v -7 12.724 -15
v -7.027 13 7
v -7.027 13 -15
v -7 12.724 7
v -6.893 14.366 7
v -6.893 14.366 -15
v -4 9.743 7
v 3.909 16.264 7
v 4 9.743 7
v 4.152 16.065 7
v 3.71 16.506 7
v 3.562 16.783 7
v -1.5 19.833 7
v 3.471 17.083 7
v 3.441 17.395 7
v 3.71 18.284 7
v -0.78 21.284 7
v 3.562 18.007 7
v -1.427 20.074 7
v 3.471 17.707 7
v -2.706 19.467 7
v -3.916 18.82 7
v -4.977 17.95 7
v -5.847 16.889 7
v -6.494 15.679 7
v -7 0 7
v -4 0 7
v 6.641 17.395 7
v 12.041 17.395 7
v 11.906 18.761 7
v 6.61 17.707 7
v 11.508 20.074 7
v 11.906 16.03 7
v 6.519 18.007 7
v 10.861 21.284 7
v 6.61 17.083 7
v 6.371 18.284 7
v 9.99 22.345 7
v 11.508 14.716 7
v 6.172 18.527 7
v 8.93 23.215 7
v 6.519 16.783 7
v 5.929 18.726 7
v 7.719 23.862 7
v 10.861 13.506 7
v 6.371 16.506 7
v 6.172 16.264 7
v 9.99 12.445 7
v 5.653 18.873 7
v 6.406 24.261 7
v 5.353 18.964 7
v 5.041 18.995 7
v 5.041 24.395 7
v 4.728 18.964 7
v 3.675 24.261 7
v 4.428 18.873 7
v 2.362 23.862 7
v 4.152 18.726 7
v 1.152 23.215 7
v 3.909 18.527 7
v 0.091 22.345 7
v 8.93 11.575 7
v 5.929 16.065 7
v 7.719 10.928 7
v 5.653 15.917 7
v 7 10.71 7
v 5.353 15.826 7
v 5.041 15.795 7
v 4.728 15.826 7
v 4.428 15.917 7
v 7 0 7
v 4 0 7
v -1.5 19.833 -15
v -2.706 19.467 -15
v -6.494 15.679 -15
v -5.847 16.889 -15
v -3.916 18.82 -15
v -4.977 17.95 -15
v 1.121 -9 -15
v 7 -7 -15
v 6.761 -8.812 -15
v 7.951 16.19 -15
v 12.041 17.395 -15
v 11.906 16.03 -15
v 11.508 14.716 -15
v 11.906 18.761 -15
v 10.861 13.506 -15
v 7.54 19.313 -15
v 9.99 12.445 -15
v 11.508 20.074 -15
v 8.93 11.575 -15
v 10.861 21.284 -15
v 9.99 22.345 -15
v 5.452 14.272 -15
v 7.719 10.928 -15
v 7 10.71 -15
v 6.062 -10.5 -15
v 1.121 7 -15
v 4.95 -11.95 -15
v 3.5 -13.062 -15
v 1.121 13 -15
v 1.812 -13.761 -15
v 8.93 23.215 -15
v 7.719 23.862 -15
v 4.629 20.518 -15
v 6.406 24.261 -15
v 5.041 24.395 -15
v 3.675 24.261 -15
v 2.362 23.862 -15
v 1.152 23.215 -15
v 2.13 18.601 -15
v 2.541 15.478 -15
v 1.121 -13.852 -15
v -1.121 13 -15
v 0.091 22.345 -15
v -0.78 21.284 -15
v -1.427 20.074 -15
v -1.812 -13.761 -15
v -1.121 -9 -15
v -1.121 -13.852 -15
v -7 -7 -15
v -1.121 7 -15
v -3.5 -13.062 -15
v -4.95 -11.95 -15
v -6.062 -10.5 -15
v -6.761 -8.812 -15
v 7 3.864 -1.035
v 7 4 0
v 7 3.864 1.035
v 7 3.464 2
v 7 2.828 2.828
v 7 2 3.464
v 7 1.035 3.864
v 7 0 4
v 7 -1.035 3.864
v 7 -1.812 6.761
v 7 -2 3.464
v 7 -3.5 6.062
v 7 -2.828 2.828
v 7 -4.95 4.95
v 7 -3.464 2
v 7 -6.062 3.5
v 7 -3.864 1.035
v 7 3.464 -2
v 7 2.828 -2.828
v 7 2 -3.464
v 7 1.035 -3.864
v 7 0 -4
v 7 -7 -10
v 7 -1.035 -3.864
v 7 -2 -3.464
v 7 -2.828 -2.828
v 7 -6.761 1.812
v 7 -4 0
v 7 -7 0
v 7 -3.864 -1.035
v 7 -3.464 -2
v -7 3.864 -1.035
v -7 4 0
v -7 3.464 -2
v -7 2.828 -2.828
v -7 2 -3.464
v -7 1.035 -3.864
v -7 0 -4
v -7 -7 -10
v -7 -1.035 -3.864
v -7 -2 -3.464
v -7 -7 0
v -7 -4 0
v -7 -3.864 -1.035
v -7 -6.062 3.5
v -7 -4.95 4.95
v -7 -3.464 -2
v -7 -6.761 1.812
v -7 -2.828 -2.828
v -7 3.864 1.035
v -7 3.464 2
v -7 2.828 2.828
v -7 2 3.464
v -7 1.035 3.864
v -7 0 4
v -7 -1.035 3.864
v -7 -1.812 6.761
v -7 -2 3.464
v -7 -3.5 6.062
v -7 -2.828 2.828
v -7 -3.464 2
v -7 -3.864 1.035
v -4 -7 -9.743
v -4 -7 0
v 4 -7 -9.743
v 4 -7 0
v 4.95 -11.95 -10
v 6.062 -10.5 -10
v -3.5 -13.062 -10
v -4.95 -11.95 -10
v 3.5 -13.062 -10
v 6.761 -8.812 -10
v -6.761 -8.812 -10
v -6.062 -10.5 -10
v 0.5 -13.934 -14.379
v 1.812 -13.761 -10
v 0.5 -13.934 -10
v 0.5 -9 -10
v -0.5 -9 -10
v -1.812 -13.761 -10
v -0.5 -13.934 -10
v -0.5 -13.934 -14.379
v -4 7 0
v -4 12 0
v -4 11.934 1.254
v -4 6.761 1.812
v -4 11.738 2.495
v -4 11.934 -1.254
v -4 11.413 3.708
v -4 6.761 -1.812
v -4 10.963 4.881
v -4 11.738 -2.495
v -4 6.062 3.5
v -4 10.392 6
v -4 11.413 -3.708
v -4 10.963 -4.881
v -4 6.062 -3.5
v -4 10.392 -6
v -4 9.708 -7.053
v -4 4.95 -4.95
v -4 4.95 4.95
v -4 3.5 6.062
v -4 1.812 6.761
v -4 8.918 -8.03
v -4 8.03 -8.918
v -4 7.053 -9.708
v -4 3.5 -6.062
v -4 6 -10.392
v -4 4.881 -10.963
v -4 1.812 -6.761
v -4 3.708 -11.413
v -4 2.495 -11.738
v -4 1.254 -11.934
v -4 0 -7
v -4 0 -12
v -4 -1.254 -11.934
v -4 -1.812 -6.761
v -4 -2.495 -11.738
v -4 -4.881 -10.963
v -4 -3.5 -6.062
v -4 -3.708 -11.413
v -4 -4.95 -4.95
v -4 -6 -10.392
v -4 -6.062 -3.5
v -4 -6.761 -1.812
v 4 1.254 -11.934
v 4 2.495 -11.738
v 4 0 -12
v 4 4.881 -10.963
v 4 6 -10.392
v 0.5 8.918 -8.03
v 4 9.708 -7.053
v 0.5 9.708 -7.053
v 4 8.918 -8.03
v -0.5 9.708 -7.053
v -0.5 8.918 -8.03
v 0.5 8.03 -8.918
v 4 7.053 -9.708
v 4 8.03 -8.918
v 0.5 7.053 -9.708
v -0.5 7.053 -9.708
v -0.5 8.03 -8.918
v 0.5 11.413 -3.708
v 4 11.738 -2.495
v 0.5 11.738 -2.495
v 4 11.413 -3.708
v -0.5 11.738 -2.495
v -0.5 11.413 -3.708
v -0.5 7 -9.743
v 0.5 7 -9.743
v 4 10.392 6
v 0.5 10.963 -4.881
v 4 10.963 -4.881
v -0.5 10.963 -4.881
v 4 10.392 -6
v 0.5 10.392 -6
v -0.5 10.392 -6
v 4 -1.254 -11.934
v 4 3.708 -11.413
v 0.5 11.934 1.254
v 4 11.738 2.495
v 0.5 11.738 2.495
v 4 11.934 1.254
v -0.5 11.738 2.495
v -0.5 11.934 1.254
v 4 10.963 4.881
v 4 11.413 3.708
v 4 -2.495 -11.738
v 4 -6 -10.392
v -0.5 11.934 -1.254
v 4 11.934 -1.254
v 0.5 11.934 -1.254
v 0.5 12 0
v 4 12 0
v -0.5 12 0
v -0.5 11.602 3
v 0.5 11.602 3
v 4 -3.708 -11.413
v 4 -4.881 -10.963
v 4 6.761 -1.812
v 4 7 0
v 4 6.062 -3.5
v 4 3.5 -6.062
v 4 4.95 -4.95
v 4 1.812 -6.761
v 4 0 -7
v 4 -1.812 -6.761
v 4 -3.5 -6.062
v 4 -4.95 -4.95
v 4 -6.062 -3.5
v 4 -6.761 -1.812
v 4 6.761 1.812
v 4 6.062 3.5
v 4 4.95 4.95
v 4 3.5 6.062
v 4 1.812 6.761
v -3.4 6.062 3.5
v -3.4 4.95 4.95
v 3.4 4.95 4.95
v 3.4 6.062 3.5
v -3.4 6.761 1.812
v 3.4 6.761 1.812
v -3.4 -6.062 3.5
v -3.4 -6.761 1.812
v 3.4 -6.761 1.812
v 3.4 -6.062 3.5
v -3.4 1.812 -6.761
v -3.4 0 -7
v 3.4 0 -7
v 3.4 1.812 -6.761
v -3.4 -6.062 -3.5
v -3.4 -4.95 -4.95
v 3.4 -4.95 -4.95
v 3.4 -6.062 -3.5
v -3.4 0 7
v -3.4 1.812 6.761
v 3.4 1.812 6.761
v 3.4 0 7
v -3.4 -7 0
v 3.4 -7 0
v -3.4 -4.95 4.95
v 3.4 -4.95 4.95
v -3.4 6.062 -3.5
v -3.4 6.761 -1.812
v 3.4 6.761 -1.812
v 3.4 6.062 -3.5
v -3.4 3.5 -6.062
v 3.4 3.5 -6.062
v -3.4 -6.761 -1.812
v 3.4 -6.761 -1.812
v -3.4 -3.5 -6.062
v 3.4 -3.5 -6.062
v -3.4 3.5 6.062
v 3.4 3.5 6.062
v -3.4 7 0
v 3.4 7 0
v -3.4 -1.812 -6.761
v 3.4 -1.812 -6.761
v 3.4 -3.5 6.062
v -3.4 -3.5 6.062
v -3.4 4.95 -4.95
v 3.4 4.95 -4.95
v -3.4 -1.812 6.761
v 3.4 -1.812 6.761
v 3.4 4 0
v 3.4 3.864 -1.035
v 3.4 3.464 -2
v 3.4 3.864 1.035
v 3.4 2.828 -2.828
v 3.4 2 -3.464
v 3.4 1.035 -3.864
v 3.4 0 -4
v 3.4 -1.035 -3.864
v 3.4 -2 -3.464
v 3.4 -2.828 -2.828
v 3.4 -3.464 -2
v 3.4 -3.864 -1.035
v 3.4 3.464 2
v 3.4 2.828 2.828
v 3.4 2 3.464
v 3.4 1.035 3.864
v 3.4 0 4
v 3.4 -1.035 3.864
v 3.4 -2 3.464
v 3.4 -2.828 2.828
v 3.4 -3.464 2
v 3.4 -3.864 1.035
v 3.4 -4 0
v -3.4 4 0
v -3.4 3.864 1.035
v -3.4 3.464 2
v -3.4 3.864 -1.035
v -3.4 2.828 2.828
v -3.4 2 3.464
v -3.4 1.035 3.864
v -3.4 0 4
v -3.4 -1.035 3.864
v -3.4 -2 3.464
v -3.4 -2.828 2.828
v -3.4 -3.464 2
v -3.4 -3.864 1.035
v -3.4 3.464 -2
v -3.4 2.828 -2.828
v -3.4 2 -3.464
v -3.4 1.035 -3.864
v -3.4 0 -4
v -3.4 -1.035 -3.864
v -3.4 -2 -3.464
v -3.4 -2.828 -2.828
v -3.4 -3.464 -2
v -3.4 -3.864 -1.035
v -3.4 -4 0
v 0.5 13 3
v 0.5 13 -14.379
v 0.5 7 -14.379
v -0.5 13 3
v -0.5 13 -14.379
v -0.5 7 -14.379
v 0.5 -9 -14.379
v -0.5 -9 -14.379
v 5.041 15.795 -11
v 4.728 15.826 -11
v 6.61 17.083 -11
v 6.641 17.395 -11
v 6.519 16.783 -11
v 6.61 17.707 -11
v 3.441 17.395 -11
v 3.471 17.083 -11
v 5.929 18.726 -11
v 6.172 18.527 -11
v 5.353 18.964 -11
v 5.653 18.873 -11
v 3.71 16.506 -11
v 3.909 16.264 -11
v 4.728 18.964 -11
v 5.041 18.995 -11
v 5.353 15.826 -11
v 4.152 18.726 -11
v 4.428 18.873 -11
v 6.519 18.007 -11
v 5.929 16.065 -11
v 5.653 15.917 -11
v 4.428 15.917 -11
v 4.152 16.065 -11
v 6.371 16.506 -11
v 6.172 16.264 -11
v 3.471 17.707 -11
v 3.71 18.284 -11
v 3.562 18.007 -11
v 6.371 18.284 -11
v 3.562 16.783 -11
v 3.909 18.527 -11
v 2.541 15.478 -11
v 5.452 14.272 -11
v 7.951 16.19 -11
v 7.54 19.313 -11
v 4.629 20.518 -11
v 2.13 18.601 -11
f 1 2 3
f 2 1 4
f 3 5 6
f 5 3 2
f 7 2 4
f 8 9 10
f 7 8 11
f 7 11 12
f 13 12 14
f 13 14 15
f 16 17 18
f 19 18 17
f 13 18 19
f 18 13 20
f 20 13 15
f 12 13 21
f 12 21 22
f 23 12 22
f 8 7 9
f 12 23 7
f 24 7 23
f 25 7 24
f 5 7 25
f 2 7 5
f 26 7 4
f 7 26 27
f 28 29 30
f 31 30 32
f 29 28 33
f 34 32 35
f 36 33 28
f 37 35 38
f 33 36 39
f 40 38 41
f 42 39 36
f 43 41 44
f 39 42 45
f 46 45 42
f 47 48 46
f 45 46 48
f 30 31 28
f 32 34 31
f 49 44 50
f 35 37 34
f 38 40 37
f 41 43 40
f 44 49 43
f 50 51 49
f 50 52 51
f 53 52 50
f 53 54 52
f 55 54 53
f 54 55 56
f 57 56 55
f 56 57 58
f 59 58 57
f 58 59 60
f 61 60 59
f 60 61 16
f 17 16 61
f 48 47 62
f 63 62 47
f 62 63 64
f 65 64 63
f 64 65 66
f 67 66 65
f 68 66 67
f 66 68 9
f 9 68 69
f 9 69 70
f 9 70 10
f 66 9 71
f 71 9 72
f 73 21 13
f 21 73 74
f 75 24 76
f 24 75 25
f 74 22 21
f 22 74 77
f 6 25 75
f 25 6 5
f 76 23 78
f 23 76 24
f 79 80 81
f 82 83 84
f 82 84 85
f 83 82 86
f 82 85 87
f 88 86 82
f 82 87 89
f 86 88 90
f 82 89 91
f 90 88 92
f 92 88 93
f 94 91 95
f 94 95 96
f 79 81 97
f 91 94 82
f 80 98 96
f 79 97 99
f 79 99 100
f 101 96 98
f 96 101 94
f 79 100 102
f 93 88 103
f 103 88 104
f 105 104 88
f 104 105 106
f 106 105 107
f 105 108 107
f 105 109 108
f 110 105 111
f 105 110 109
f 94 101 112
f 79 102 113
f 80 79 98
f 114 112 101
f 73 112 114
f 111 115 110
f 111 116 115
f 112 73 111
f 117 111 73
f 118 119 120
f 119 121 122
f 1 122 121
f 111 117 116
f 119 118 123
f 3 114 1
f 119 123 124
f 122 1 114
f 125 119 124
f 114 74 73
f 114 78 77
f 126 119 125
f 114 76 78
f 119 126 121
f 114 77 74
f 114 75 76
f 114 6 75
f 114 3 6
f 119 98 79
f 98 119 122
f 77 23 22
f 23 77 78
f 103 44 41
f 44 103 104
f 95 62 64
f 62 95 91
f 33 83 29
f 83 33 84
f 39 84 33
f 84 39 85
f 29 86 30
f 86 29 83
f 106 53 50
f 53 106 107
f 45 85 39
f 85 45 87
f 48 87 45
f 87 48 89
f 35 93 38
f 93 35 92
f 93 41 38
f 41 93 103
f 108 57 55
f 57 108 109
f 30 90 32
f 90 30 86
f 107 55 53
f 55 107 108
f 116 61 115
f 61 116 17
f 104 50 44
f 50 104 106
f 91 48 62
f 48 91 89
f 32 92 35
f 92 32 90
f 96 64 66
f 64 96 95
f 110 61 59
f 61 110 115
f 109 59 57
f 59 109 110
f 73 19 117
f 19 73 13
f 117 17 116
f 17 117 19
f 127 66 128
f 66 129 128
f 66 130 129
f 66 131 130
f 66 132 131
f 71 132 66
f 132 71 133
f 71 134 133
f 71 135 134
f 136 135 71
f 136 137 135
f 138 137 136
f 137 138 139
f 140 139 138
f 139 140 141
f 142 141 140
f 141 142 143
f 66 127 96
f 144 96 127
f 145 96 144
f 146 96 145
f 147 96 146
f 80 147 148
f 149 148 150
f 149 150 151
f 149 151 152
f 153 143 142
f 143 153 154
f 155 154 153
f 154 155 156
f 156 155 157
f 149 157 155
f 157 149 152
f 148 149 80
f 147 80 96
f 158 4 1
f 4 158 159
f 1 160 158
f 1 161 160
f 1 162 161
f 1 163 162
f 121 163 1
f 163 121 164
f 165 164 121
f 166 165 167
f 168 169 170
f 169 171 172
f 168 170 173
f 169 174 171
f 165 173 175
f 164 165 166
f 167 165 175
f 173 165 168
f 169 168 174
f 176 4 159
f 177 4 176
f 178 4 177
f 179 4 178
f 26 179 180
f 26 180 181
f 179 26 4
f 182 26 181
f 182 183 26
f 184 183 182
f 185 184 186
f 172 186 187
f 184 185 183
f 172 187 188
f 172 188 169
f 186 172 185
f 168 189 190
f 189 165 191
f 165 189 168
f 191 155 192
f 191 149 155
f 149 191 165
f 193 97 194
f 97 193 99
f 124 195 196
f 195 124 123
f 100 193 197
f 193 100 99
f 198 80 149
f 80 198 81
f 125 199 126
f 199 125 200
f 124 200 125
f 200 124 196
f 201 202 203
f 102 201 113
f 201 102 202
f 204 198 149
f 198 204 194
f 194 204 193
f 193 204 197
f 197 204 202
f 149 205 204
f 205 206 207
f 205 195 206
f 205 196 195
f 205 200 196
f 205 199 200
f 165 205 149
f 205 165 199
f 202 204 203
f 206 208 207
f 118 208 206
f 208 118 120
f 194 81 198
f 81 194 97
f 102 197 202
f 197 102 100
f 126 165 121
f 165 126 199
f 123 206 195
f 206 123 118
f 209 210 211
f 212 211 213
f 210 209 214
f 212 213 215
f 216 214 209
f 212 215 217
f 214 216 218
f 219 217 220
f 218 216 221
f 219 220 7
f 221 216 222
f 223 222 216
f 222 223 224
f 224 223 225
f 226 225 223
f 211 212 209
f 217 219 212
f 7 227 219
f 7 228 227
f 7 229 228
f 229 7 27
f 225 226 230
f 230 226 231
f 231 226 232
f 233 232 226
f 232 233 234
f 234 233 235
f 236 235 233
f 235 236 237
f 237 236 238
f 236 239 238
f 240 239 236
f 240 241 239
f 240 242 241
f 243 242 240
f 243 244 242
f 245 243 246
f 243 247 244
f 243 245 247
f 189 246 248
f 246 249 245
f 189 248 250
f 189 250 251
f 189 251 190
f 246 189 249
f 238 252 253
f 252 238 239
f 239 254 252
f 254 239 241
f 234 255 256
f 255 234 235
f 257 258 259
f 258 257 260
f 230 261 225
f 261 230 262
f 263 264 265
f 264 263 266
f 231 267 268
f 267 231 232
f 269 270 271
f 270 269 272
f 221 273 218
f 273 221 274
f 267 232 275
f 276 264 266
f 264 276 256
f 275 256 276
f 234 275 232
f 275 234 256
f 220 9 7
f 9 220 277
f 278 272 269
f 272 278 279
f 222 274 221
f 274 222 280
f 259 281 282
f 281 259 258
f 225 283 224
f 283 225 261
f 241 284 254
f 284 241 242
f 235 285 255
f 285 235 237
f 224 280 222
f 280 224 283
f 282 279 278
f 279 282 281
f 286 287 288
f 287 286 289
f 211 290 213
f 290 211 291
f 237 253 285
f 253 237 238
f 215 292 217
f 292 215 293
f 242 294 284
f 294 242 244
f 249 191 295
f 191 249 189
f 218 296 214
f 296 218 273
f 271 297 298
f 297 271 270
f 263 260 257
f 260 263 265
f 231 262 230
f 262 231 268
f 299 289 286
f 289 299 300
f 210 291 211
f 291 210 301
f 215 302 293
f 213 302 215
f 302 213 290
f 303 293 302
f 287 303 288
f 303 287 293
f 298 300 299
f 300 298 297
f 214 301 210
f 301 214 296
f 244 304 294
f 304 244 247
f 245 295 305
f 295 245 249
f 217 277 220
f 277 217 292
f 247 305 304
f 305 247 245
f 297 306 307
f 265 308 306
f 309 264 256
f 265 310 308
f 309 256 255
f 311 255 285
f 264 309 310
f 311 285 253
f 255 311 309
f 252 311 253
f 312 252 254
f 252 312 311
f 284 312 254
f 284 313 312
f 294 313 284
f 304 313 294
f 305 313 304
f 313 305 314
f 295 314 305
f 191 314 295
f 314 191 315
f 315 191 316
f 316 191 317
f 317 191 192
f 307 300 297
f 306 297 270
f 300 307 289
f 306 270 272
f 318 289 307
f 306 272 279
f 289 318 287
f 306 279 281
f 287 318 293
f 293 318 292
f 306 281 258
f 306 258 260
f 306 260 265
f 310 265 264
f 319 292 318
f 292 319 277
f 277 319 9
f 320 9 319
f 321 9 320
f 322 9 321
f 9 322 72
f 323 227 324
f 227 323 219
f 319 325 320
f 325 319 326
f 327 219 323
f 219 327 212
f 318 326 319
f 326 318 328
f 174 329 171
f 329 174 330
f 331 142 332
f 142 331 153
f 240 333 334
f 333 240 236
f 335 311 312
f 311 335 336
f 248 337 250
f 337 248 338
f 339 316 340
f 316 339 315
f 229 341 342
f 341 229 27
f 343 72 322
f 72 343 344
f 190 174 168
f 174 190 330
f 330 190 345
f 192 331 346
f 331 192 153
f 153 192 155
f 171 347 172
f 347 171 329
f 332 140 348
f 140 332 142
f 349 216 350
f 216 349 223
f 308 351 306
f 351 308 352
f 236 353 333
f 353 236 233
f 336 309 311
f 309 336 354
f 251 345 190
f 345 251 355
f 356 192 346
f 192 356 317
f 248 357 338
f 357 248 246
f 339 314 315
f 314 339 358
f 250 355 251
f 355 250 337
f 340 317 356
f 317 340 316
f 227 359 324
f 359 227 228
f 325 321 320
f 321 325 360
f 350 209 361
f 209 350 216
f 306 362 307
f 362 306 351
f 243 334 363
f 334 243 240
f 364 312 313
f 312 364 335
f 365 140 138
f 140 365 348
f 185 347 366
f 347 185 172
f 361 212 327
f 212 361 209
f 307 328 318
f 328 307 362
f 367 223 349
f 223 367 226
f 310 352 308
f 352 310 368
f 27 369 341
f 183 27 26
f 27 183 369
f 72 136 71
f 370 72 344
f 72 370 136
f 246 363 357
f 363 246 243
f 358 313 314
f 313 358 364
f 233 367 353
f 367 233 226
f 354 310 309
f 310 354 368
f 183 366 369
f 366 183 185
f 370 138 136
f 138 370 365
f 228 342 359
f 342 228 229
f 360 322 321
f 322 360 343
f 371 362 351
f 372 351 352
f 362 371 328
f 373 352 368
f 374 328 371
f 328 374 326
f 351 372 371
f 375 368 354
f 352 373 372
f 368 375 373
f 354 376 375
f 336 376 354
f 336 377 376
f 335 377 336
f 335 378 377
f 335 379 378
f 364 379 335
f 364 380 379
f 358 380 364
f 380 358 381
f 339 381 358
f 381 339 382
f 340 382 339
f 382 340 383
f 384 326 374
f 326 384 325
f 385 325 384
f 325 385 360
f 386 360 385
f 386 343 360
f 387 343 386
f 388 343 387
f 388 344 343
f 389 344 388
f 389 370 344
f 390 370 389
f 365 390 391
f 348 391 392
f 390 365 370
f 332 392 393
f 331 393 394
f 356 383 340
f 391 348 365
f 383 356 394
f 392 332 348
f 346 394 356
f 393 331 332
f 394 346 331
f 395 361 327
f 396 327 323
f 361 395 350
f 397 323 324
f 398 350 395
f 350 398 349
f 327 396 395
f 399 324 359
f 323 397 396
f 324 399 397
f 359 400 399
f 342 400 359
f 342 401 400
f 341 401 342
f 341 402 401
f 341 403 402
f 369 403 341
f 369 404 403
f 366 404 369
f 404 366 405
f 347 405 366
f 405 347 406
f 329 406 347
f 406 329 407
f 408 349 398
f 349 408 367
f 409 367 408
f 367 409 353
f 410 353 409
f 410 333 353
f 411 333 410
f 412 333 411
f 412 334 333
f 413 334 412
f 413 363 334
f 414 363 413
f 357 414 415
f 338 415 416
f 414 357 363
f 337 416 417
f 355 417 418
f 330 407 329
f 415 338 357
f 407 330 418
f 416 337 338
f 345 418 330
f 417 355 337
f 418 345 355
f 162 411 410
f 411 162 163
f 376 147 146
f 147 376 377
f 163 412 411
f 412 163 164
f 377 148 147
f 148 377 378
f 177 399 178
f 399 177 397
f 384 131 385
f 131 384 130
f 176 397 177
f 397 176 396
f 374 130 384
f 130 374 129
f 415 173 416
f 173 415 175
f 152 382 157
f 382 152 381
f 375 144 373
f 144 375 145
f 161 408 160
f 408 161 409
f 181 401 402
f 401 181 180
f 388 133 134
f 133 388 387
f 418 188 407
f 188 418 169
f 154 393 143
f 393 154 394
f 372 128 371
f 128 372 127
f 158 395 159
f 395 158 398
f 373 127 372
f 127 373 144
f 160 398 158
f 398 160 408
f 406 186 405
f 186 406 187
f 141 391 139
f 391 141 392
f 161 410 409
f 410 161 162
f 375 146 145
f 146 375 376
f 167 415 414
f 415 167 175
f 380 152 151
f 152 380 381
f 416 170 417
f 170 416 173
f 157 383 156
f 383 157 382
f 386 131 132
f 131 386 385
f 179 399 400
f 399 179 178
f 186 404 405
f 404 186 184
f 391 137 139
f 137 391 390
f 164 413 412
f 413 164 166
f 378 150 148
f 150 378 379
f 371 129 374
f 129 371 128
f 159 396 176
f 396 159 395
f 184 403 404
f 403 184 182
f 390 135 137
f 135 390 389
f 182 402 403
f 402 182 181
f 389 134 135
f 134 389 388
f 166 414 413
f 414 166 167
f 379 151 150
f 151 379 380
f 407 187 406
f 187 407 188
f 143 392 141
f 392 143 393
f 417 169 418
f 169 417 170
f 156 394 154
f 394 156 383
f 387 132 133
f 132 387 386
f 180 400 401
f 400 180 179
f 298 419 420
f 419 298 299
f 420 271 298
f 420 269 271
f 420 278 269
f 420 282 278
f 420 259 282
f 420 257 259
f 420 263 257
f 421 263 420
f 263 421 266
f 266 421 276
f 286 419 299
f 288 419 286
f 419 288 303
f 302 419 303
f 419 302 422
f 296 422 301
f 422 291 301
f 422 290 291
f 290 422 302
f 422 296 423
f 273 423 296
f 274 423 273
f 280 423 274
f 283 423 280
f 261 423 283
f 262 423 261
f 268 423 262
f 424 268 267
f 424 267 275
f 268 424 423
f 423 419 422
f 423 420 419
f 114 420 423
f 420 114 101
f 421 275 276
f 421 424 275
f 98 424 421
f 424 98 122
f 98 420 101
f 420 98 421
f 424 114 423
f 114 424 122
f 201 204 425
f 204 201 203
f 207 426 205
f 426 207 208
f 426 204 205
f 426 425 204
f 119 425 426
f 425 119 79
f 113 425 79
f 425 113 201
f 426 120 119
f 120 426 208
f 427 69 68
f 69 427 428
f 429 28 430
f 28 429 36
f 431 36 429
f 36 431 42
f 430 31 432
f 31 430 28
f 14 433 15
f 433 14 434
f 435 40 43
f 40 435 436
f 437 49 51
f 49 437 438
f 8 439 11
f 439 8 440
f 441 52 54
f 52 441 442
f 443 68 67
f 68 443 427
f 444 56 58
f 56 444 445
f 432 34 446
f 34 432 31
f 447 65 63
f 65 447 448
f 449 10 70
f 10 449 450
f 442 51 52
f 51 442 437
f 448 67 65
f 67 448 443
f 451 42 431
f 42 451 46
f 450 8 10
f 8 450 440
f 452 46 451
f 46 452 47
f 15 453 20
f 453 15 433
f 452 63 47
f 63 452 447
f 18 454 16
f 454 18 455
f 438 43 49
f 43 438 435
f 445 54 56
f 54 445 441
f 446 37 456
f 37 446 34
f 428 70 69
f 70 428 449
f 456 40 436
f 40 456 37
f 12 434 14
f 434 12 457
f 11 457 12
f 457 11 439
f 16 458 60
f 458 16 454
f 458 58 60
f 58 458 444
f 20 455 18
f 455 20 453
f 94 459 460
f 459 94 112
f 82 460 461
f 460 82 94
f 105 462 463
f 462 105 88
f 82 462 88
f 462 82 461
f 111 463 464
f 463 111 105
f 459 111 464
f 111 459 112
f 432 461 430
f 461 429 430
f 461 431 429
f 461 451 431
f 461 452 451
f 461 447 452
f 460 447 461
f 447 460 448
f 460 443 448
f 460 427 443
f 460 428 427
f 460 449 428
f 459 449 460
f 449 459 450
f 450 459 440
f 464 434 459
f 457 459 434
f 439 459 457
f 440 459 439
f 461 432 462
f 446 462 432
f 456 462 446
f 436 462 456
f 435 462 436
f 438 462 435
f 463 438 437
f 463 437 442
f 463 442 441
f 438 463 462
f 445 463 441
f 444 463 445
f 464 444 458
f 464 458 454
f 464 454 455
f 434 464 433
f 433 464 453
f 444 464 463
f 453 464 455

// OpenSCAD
// file: configuration.scad
// OD = outside diameter, corner to corner.
m3_nut_od = 6.1;
m3_nut_radius = (m3_nut_od+0.2)/2;
m3_nut_h=3;

// Major diameter of metric 3mm thread.
m3_major = 2.85;
m3_radius = m3_major/2;
m3_open_radius = 3.2/2;
m3_cap=4;
m3_clr=0.2;

m_frame_major = 3.8;
m_frame_radius=m_frame_major/2;
m_frame_clr=0.3;
m_frame_open=m_frame_radius+m_frame_clr*2;
m_frame_cap=8/2;
m_frame_nut=8/2;

// NEMA17 stepper motors.
motor_d=48;
motor_shaft_diameter = 5;
motor_shaft_radius = (motor_shaft_diameter+0.3)/2;

//frame motor dimm
motor_screws = 31; // mm center-to-center
motor_width = 42.5; // mm total motor face width
motor_height = 15; // mm bracket height
motor_length = 12; // mm bracket length
motor_screws_height = (motor_width - motor_screws) / 2;
motor_shaft = 30; // mm from motor face to OpenBeam center
motor_thickness = 5; // mm bracket thickness
//height = 2*extr + motor_width;
//diagonal = extr*sqrt(2);
motor_offset = motor_shaft+2;

// Frame brackets.
thickness = 3.6;

// extrusion dimmensions
extr = 20; //15 - 20 for 20x20 extrusion
extr_tslot = 6.8; //3.2 6.8 for 20x20 extrusion
extr_nut = 11; //5.8 11 for 20x20 extrusion
extr_corn = (extr - extr_tslot)/2;
diagonal=extr*sqrt(2);

clear = 0.35;
// corner parametrs
frame_thickness=6;
bracket = 5;
frame_type=0; //type 0 solid or 1 for sepparate parts
radius = thickness+cos(30)*diagonal/2+frame_thickness;
slot_hole=3;

//roller parametrs
extr_clr=0.7; // extrusion clearence distance
cone_radius = 5;
cone_radius_dwn = 4;
shrink_wrap = 0.1; // mm thickness
h_base=7;
H_roller=diagonal/2+extr_clr+h_base;
W_roller=diagonal/2+extr_clr+m3_radius;
rod_offset=W_roller+5; //(25)
layer_h=0.4;


// motor offset change 24mm - pulley size +2mm offset
//if (motor_shaft < 24) {
  //motor_offset = 24 ;
  //}
  //else  {motor_offset = 24;
  //}

//dimmensions calculations for frame_motor (some trigonometry)

f1= (extr*sin(15)+thickness)/cos(30);
f2=(extr*sin(15)+thickness)*cos(60)/sin(60);
L=f1+diagonal+motor_offset;
f4=L*sin(30)/cos(30)-motor_d/2;
f3=f4/2;
w_fm = L/cos(30)-f3-f2;

//motor cut_off frame
h_mot_cut_off = L*sin(30) - (motor_screws - motor_d/2)*cos(30);
// main file
include <configuration.scad>;

offset_x = -12;
offset_y = 12;
rotate_z = -22.5;

module tensioner_608() {
  difference() {
    union() {
      difference() {
        union() {
	        rotate([0, 0, rotate_z]) 
            translate([offset_x, offset_y, -4])
              {	              
	            translate([7, 0, 0]) cylinder(r=7, h=22, center=true, $fn=32);
	            translate([10, 6, 0]) cylinder(r=7, h=22, center=true, $fn=32);
	            } 
          translate([0, 3, -4])
            cube([14, 20, 22], center=true);
          translate([0, -7, -12.5])
            cylinder(r=7, h=5, center=true, $fn=24);
        }
        translate([0, -11, 11])
          cube([18, 22, 22], center=true);
        rotate([0, 90, 0])
          cylinder(r=12, h=8, center=true, $fn=60);
      }
      rotate([0, 90, 0]) 
        cylinder(r=7, h=14, center=true, $fn=24);
    }
    rotate([0, 90, 0]) {
      cylinder(r=11, h=6.8, center=true);
      cylinder(r=4, h=18, center=true, $fn=24);
    }
    
//fillament holes
    for (y = [10, -12]) {
      translate([0, y, -7])
        cube([1, 6, 20], center=true);
      translate([0, y, -16])
        rotate([0, 45, 0]) cube([3, 6, 3], center=true);
    }
   rotate([0, 0, rotate_z]) {
      translate([offset_x+10, offset_y+6, -4])        
        cylinder(r=m3_open_radius , h=50, center=true, $fn=32);
      translate([offset_x+10, offset_y+6, -16])
        cylinder(r=m3_nut_radius, h=5, center=false, $fn=6); 
        
     
    }      
  }
}


  tensioner_608();
